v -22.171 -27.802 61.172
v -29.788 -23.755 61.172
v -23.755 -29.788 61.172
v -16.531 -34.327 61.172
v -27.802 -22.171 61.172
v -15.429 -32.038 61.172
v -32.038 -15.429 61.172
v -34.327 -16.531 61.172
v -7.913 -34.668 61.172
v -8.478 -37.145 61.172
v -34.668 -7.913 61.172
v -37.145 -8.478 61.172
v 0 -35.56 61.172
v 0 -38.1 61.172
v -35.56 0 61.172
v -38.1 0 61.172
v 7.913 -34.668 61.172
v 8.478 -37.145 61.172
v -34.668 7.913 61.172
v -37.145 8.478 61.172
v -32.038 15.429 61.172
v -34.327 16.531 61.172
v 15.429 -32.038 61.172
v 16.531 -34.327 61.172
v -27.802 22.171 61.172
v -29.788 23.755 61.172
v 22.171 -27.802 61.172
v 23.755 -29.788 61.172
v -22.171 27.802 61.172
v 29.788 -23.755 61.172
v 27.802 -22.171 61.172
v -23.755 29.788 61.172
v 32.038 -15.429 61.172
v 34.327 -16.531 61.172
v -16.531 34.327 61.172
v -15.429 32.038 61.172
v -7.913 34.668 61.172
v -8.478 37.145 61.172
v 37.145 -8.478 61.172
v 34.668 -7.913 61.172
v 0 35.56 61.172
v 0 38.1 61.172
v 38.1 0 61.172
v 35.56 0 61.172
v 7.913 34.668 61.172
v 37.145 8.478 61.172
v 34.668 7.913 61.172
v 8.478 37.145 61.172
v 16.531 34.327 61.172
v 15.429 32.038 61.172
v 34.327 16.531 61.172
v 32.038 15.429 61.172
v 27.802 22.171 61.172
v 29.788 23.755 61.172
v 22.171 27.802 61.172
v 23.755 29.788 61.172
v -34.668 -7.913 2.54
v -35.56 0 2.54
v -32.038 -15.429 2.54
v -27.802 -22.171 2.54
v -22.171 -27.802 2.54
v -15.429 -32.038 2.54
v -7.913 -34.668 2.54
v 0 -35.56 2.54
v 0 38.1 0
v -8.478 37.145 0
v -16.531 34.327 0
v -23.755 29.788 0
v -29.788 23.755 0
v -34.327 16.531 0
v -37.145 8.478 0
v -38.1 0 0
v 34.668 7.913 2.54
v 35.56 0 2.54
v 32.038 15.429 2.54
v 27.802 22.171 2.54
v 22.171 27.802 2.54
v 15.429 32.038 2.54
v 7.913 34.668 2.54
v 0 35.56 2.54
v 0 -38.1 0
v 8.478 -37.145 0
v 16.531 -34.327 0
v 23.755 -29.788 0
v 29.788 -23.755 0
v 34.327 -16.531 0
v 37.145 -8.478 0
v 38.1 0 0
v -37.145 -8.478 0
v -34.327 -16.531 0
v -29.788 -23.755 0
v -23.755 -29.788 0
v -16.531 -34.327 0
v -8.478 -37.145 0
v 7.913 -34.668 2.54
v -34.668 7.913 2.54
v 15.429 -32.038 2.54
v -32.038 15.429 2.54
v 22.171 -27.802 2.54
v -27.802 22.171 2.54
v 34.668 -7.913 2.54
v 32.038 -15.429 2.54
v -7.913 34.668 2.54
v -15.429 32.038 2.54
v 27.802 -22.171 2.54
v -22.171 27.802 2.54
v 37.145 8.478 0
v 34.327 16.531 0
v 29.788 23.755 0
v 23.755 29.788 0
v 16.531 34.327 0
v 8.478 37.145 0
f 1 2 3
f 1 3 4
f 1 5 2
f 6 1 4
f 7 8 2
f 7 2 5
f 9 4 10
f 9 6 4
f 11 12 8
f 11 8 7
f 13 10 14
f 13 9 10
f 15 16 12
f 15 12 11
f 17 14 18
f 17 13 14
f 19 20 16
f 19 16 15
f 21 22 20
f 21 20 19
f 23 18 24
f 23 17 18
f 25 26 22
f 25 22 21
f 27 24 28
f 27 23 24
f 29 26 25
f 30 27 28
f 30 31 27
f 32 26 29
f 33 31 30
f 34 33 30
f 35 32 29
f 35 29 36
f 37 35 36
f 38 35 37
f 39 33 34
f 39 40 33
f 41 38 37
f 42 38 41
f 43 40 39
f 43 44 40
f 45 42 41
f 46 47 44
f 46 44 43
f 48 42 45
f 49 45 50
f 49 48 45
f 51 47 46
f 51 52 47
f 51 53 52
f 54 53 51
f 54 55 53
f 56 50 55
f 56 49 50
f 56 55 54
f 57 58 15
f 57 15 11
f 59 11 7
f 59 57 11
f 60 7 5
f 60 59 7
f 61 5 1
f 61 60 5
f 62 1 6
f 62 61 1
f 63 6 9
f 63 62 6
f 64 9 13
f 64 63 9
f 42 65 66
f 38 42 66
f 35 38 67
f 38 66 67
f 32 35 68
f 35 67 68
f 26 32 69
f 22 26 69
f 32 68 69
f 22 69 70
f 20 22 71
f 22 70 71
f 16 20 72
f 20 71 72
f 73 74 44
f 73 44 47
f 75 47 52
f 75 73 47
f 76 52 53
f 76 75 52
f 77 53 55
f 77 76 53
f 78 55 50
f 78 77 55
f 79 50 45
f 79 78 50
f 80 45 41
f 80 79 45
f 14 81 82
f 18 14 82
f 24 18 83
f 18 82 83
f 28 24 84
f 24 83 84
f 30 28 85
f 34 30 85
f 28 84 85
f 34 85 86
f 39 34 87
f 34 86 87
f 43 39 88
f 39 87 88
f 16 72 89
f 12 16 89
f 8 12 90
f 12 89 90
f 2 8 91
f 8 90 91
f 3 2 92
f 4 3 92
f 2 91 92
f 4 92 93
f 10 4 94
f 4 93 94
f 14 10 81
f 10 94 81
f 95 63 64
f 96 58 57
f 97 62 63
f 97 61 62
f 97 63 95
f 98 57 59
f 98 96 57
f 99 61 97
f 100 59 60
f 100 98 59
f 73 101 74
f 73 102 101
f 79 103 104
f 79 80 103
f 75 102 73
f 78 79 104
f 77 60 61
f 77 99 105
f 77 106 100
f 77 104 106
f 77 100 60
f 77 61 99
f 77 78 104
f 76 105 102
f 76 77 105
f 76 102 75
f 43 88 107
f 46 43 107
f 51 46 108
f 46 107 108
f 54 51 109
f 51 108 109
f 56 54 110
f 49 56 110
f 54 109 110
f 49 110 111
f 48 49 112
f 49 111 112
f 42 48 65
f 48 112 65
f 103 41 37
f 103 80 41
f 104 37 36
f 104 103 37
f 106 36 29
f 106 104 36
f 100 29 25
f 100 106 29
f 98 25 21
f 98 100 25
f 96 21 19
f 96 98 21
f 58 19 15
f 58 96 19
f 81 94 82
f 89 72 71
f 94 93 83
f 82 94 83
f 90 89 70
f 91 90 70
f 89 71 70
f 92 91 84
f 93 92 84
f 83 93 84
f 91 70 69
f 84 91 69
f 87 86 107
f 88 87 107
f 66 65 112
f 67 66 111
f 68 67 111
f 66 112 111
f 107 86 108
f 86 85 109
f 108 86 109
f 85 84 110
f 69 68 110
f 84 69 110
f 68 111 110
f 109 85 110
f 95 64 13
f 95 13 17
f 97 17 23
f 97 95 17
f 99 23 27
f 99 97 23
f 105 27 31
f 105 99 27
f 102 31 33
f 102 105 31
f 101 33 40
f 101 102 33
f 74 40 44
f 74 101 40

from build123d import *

# Parameters (mm, degrees)
F1_DEPTH = 61.171658
F2_T     = -2.54


with BuildPart() as f1:
    # F0 (on Top) → F1 (new body)
    with BuildSketch(Plane.XY):
        with BuildLine():
            ThreePointArc((-38.1, 0), (-26.940768, -26.940768), (0, -38.1))
            ThreePointArc((0, -38.1), (26.940768, -26.940768), (38.1, 0))
            ThreePointArc((38.1, 0), (26.940768, 26.940768), (0, 38.1))
            ThreePointArc((0, 38.1), (-26.940768, 26.940768), (-38.1, 0))
        make_face()
    extrude(amount=F1_DEPTH)

    # F2
    f2_openings = [f1.faces().sort_by_distance(p)[0] for p in [
        (0, 0, 61.171658),
    ]]
    offset(amount=F2_T, openings=f2_openings)


solid = f1.part
